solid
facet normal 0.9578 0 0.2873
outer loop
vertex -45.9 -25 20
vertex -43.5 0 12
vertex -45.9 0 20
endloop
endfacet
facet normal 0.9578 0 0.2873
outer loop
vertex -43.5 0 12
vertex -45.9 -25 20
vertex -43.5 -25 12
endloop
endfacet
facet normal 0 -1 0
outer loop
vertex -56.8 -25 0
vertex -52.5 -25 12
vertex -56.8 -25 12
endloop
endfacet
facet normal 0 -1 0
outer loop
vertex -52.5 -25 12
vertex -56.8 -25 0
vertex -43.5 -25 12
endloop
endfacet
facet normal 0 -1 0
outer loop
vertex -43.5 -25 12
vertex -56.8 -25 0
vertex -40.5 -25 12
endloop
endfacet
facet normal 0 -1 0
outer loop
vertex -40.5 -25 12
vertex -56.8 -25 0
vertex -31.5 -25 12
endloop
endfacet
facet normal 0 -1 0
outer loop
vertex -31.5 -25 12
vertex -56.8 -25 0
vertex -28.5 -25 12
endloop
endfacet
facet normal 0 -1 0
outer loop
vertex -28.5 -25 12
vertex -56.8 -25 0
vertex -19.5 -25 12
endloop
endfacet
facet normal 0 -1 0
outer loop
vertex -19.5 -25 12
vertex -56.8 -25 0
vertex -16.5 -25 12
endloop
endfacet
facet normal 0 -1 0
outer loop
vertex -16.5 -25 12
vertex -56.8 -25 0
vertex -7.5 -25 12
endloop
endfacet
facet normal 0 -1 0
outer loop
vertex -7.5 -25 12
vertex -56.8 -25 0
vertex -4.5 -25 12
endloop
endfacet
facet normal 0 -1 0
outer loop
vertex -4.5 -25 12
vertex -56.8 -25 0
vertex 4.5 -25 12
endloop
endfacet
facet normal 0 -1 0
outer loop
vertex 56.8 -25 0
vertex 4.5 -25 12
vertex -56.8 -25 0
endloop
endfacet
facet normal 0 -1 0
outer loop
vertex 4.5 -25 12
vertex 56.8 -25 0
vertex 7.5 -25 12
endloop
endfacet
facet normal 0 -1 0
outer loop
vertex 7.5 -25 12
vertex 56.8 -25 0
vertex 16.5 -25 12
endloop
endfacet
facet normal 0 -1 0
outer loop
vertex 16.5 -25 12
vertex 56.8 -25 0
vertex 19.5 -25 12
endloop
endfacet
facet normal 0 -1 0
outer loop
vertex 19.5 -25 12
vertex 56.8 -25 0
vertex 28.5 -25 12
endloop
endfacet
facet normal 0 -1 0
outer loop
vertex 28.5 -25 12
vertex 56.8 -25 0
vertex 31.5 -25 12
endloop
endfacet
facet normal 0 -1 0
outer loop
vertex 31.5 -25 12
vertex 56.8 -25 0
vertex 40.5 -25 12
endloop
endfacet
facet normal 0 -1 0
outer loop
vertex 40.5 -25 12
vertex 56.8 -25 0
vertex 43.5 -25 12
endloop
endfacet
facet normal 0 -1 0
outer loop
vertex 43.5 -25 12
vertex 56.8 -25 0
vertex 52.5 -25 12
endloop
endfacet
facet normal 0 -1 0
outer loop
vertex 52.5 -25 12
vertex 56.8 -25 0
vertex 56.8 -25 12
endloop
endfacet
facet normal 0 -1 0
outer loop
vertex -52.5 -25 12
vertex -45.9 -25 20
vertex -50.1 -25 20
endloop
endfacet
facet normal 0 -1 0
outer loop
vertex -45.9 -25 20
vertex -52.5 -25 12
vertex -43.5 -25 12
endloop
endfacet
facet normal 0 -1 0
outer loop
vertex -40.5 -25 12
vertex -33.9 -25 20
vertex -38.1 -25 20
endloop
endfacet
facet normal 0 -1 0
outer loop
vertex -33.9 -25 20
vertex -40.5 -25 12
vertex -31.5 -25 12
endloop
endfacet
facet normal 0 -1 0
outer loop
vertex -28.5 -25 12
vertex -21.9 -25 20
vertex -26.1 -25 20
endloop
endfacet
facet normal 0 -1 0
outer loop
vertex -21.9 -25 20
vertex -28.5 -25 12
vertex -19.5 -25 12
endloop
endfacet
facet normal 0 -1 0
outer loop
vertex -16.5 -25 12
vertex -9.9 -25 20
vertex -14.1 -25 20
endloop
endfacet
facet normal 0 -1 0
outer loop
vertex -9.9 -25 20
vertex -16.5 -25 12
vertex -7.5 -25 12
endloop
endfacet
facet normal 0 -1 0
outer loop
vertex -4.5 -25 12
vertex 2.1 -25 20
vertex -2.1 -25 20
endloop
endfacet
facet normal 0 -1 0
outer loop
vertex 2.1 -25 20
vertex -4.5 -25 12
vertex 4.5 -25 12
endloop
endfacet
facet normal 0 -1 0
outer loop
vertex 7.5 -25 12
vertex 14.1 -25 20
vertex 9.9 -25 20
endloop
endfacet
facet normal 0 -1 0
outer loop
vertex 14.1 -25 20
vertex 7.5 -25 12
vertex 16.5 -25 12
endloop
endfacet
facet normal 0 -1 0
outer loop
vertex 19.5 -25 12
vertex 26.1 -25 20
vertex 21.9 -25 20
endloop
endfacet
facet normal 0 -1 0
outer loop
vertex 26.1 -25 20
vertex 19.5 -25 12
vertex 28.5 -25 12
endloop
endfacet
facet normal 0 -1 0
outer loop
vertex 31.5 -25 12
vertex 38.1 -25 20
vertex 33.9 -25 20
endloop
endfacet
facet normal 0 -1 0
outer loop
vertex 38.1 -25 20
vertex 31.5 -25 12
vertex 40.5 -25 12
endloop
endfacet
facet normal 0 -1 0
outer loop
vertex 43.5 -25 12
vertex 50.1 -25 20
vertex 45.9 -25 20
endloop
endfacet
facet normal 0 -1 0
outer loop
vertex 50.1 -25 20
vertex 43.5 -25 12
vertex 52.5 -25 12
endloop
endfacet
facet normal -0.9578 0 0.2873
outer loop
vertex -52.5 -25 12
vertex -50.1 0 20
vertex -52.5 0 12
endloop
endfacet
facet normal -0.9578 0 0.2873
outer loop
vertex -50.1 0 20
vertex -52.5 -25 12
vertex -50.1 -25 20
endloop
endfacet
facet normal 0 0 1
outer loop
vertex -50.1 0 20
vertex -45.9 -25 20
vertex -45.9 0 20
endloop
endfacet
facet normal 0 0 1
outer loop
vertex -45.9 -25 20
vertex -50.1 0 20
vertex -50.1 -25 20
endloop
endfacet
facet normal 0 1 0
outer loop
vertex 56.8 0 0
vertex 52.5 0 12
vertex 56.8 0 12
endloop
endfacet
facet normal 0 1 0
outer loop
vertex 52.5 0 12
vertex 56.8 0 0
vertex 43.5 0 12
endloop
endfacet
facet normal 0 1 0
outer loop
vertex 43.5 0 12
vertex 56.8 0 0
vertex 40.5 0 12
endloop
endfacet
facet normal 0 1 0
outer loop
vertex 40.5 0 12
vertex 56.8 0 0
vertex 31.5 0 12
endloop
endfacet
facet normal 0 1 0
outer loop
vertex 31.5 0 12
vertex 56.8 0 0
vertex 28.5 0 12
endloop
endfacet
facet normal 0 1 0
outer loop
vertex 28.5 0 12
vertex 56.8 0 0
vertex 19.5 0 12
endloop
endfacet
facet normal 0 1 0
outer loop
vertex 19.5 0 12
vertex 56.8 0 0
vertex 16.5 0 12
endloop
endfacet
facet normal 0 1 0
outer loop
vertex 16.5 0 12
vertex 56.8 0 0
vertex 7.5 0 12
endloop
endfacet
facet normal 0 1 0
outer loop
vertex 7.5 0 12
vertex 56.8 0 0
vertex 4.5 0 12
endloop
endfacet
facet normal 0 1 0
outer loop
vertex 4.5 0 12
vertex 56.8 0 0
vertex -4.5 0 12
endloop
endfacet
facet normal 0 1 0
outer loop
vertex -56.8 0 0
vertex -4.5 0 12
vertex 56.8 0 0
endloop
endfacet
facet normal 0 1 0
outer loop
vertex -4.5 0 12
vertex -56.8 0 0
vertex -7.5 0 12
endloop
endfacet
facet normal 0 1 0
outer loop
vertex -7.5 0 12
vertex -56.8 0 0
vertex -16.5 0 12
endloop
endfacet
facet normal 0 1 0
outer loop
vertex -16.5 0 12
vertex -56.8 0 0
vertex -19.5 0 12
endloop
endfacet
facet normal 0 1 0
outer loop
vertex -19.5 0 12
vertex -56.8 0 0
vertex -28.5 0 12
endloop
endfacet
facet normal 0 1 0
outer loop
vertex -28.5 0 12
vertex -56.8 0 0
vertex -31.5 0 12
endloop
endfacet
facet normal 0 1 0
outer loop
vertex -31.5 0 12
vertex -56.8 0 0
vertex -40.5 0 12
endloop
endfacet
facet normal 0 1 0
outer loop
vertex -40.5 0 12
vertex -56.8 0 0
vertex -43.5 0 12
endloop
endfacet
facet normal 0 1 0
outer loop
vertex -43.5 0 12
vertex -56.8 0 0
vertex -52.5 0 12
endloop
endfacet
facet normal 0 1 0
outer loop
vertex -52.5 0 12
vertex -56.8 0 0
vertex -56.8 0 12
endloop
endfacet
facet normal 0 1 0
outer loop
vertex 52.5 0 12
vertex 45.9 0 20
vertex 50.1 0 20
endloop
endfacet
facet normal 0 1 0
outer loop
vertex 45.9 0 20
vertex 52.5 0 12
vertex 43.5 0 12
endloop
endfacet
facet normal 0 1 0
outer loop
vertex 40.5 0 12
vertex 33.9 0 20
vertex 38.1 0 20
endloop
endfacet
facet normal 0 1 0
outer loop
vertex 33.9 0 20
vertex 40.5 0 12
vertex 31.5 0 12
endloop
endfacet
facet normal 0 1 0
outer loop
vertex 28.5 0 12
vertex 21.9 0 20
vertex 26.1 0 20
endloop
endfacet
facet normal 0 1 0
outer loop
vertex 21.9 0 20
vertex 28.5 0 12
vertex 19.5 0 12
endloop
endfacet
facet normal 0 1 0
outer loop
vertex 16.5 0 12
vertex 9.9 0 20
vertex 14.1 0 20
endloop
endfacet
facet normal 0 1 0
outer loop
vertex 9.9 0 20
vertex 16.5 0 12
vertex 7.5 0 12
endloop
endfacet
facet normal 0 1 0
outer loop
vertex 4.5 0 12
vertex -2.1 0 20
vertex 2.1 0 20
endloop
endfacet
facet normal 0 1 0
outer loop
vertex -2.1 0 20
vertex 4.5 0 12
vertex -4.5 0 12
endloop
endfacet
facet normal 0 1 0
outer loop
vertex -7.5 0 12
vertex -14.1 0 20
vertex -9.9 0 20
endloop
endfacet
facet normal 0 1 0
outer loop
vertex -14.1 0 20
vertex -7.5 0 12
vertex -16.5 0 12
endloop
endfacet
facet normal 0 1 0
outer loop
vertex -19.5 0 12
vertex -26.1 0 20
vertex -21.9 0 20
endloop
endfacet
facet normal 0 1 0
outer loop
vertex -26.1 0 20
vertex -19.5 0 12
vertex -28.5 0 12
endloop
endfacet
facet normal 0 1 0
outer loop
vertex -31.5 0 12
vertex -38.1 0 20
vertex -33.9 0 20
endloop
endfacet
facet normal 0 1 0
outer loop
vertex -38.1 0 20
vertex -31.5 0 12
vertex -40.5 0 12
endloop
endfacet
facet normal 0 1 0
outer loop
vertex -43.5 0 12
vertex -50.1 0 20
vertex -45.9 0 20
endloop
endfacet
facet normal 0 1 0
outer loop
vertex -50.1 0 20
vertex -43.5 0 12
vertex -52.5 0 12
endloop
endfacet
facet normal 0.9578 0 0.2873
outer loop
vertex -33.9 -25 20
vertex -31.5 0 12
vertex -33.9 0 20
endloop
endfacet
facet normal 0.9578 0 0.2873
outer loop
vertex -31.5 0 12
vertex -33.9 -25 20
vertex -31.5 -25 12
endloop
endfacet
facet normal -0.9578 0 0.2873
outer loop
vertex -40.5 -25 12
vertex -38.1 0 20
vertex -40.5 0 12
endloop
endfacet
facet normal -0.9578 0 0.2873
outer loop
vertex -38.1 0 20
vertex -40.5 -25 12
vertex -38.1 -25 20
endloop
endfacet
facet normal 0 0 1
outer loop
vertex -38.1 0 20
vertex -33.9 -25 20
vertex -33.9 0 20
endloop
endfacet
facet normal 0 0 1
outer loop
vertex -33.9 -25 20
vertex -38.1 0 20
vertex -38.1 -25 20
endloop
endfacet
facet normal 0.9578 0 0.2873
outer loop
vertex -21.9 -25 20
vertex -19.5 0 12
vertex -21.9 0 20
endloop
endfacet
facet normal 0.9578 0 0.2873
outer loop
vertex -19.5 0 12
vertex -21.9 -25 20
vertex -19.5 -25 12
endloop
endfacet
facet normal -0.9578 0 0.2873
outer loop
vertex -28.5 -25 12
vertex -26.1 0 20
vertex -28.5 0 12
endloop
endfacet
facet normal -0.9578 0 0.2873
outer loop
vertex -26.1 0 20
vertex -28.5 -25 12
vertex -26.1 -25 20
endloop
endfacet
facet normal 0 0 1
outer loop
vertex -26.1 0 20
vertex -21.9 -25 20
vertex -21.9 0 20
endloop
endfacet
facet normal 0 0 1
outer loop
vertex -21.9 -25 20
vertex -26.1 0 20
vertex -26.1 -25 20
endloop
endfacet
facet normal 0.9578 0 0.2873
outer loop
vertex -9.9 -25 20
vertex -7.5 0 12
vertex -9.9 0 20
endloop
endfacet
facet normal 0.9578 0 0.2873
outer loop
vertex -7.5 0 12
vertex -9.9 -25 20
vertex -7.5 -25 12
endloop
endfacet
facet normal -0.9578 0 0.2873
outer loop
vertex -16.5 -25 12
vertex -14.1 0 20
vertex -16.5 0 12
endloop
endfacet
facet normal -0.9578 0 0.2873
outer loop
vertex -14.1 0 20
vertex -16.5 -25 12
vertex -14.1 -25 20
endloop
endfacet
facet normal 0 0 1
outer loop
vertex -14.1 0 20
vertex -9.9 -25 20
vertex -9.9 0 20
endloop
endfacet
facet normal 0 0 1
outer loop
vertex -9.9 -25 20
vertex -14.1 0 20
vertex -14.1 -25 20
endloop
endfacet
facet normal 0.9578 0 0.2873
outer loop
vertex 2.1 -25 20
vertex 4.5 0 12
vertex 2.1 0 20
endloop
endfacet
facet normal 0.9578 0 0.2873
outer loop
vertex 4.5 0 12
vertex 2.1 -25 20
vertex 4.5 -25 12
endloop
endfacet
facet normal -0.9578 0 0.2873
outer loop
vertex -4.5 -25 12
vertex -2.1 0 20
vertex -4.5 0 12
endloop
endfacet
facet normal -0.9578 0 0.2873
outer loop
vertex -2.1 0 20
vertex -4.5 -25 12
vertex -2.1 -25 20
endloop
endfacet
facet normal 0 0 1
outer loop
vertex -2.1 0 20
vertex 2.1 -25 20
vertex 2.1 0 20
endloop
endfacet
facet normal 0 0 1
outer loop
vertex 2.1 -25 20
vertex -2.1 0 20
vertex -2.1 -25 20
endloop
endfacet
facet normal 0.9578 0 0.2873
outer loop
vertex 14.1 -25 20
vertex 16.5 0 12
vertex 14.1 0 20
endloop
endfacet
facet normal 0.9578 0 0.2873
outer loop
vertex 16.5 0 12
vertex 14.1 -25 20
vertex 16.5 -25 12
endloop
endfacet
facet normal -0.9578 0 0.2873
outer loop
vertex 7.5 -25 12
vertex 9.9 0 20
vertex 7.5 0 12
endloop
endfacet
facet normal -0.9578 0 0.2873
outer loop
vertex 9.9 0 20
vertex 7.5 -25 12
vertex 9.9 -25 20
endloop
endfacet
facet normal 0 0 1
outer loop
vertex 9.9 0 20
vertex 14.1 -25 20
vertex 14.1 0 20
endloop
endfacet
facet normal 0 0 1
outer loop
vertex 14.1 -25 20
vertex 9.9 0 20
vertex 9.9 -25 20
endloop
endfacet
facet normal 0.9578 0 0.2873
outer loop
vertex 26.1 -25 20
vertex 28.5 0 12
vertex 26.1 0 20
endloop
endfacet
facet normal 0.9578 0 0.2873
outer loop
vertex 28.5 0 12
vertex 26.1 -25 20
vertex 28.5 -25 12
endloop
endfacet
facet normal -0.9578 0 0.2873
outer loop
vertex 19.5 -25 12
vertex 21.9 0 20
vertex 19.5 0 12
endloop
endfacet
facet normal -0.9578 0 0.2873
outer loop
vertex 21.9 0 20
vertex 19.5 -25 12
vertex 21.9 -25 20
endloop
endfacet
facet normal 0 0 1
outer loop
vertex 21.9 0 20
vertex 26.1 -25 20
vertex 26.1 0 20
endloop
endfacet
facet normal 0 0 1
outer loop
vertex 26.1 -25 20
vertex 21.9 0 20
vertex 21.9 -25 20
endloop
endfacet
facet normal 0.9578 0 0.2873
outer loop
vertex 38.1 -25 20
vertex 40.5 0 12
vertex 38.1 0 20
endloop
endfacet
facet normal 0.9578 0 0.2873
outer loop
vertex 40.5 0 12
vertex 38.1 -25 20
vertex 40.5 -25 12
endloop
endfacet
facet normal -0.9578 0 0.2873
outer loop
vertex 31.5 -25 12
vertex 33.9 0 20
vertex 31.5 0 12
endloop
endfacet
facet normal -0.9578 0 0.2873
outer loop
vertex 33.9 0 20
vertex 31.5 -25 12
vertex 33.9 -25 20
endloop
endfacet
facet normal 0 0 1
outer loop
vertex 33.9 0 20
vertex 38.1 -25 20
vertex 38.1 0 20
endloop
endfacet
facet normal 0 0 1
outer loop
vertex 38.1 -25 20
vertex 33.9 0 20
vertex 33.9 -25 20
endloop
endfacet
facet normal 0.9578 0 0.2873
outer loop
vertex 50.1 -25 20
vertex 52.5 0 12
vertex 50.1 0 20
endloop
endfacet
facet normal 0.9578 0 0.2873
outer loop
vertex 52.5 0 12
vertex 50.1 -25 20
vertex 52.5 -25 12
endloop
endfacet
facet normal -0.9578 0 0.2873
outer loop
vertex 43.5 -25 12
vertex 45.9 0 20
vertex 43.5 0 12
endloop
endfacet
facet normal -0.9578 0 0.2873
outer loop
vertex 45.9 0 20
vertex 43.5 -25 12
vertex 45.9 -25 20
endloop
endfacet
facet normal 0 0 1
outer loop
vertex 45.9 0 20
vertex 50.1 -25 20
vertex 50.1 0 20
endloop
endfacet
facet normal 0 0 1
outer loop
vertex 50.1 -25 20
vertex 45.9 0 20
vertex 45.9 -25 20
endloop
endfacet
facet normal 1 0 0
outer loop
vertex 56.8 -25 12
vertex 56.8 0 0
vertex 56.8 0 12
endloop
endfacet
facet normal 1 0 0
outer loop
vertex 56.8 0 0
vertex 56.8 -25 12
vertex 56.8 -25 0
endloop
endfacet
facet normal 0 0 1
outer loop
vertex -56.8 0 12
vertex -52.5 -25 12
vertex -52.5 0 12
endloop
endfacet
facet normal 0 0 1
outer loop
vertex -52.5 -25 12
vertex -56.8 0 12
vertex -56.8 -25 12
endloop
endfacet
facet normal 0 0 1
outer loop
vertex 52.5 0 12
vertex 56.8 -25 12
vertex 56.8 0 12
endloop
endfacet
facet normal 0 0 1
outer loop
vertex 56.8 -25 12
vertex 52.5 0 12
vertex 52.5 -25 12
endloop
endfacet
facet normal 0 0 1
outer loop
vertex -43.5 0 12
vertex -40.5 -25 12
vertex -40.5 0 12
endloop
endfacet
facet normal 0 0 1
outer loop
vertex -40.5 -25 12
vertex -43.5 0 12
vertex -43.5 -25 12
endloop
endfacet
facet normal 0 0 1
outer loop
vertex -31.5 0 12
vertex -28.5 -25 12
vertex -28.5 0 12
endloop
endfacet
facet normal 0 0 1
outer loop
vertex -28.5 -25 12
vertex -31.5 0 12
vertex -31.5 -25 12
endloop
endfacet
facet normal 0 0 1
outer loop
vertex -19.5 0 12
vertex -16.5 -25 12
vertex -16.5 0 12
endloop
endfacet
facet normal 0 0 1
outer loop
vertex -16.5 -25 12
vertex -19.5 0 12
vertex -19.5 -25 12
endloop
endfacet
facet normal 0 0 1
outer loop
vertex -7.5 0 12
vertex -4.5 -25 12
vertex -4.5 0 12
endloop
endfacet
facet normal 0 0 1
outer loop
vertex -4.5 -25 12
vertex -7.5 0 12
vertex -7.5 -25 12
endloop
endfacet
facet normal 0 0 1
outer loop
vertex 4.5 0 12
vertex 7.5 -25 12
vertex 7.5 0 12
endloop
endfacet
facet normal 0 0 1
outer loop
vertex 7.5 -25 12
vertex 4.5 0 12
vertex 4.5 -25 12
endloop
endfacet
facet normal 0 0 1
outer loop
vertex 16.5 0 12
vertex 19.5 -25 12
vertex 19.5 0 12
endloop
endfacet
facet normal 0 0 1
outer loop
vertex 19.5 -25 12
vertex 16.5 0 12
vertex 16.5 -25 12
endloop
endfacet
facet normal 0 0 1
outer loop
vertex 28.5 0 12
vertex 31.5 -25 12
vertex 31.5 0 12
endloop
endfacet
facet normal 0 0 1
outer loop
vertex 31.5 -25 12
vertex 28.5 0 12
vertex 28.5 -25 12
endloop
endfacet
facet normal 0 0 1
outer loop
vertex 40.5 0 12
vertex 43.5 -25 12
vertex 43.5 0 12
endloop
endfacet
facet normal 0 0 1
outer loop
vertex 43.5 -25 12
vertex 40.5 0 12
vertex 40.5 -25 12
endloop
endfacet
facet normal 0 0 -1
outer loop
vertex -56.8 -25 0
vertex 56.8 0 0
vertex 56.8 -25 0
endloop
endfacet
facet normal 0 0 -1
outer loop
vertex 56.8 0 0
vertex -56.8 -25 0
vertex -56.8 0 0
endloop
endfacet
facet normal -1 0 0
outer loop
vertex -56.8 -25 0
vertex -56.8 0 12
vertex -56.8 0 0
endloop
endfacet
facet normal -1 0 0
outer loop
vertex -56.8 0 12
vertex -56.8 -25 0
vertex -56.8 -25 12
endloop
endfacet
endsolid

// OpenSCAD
$fn = 32;

// ----------------------------------------------------------------------
// Toothed rack, 9 teeth
// 12 mm pitch, 8 mm teeth
// ----------------------------------------------------------------------

// --- parameters (mm) ---
bar_w = 25;     // bar width (Y)
bar_h = 12;     // bar height (Z)
teeth = 9;      // number of teeth
pitch = 12;     // tooth pitch
tooth_h = 8;    // tooth height above the bar
root_w = 9.6;   // tooth width at the root
crest_w = 4.2;  // tooth width at the crest

// --- derived feature positions (mm) ---
span = (teeth - 1) * pitch;  // = 96   distance between the outer teeth
bar_l = span + root_w + 8;   // = 113.6   bar length: teeth plus 4 mm at each end
tooth_x = -span / 2;         // = -48   X of the first tooth
height = bar_h + tooth_h;    // = 20   overall height
feature_centers = [
  [tooth_x + 0 * pitch, -bar_w / 2],
  [tooth_x + 1 * pitch, -bar_w / 2],
  [tooth_x + 2 * pitch, -bar_w / 2],
  [tooth_x + 3 * pitch, -bar_w / 2],
  [tooth_x + 4 * pitch, -bar_w / 2],
  [tooth_x + 5 * pitch, -bar_w / 2],
  [tooth_x + 6 * pitch, -bar_w / 2],
  [tooth_x + 7 * pitch, -bar_w / 2],
  [tooth_x + 8 * pitch, -bar_w / 2]
];   // tooth centre line, drives the tooth loop

// bar with a rack of teeth, one extruded trapezoium per centre
module rack_tooth() {
  linear_extrude(height = bar_w)
    polygon(points = [
      [0, 0],
      [root_w, 0],
      [root_w / 2 + crest_w / 2, tooth_h + 1],
      [root_w / 2 - crest_w / 2, tooth_h + 1]
    ]);
}

union() {
  translate([-bar_l / 2, -bar_w, 0]) cube([bar_l, bar_w, bar_h]);
  for (centre = feature_centers)
    translate([centre[0] - root_w / 2, 0, bar_h - 1]) rotate([90, 0, 0]) rack_tooth();
}
